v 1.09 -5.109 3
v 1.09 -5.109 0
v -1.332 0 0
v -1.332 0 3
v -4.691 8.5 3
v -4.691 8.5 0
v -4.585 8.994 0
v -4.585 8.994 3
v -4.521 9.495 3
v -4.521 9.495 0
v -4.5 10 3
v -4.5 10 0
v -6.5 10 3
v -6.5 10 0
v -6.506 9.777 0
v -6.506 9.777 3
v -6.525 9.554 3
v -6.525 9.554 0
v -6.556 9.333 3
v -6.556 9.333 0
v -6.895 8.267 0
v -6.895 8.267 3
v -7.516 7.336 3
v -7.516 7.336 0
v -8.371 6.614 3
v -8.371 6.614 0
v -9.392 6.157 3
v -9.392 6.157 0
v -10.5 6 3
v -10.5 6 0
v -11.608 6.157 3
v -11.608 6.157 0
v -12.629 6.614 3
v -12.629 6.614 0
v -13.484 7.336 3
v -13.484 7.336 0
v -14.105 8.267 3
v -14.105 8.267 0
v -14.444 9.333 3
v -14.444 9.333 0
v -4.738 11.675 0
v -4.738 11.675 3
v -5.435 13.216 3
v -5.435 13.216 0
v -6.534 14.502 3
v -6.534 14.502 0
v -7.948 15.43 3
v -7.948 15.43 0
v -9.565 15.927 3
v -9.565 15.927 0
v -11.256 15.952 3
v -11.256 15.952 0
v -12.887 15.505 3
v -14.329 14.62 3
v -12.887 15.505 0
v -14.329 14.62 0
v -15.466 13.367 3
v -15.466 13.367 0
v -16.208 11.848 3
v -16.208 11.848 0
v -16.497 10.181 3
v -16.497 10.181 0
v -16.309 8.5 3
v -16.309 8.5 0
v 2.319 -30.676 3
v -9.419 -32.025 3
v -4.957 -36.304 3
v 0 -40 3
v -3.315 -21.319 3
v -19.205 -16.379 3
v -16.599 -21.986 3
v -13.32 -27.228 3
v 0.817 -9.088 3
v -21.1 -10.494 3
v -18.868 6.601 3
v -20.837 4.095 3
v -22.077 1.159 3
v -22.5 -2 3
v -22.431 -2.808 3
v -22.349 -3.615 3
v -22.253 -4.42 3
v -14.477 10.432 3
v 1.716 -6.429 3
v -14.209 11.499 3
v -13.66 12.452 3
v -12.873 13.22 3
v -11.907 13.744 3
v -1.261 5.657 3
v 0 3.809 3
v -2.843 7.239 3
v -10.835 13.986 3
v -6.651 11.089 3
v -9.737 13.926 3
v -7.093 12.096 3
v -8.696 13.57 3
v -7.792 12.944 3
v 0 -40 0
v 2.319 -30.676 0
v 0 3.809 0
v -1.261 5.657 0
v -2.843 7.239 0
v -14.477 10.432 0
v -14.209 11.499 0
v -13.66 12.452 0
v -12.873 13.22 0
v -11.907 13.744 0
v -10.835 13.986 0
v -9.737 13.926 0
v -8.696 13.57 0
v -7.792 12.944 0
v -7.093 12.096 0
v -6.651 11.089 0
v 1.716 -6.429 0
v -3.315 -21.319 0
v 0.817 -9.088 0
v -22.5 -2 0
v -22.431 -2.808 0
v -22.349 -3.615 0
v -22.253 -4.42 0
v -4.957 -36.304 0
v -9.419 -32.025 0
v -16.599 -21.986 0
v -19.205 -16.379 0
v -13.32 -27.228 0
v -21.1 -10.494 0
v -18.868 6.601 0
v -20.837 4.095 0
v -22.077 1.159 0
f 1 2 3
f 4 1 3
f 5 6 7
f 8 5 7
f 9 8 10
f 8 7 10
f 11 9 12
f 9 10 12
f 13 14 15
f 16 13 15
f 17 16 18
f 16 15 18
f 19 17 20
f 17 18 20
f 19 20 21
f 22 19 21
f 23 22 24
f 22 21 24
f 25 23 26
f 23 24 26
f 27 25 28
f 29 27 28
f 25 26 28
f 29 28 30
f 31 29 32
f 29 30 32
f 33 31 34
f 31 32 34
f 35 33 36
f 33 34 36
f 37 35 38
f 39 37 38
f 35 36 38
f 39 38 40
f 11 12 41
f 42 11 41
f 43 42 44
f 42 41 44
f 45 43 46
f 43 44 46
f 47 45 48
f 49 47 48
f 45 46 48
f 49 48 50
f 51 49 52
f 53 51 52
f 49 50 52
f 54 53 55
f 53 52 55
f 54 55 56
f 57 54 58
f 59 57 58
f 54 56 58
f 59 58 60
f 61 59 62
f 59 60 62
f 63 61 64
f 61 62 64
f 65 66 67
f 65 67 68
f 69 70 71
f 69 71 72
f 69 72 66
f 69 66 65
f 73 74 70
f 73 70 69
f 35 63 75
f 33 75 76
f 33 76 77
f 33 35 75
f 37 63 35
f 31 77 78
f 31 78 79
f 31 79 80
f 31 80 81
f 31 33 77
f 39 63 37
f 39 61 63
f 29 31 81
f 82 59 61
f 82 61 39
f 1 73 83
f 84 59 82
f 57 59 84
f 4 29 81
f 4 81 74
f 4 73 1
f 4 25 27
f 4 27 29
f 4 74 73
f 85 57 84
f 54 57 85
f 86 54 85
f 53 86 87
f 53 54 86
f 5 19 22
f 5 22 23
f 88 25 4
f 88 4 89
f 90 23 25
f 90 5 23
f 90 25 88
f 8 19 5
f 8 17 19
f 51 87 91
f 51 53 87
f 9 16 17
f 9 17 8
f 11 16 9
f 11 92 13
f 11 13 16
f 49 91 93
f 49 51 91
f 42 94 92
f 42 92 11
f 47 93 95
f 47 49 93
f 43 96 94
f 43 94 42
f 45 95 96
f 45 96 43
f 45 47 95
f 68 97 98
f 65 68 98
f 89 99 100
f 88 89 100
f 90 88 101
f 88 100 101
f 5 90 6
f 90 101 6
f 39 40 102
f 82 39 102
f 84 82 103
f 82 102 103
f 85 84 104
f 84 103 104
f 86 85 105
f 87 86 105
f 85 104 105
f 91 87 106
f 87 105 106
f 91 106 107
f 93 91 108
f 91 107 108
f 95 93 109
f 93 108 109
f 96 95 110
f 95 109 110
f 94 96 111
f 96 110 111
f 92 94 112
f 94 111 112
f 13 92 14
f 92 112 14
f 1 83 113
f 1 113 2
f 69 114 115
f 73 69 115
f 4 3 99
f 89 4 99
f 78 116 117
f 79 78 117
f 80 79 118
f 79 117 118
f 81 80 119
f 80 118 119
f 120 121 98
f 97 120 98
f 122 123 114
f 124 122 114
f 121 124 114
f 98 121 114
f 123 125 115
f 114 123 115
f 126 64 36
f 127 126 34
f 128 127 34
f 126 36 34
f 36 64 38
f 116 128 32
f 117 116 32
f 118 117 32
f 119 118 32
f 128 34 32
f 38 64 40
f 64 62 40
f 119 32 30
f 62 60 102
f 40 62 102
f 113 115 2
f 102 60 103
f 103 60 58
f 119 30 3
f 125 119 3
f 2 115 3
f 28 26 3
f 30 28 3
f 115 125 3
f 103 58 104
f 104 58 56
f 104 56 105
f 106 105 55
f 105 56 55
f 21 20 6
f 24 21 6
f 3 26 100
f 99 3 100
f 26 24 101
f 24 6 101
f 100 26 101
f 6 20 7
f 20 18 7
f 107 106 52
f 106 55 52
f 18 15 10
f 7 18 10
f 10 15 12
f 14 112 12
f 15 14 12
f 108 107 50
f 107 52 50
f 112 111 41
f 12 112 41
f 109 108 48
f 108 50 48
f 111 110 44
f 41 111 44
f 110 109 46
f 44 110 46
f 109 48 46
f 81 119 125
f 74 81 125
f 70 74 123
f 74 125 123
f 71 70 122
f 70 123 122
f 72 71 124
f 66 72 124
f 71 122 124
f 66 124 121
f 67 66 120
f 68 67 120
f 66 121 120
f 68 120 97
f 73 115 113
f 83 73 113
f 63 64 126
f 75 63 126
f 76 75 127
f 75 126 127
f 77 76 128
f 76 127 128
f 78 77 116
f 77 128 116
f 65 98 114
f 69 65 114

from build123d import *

# Parameters (mm, degrees)
F1_DEPTH = 3


with BuildPart() as f1:
    # F0 (on Top) → F1 (new body)
    with BuildSketch(Plane.XY):
        with BuildLine():
            ThreePointArc((-6.5559468113, 9.3333333333), (-5.6054684353, 8.9564392374), (-4.6905249807, 8.5))
            ThreePointArc((-4.6905249807, 8.5), (-4.5478218224, 9.2439742451), (-4.5, 10))
            ThreePointArc((-4.5, 10), (-11.2560257549, 15.9521781776), (-16.3094750193, 8.5))
            ThreePointArc((-16.3094750193, 8.5), (-15.3945315647, 8.9564392374), (-14.4440531887, 9.3333333333))
            ThreePointArc((-14.4440531887, 9.3333333333), (-10.8345050411, 13.9859887578), (-6.5, 10))
            ThreePointArc((-6.5, 10), (-6.5140112422, 9.6654949589), (-6.5559468113, 9.3333333333))
        make_face()
        with BuildLine():
            ThreePointArc((-16.3094750193, 8.5), (-10.5, 4), (-4.6905249807, 8.5))
            ThreePointArc((-4.6905249807, 8.5), (-5.6054684353, 8.9564392374), (-6.5559468113, 9.3333333333))
            ThreePointArc((-6.5559468113, 9.3333333333), (-10.5, 6), (-14.4440531887, 9.3333333333))
            ThreePointArc((-14.4440531887, 9.3333333333), (-15.3945315647, 8.9564392374), (-16.3094750193, 8.5))
        make_face()
        with BuildLine():
            ThreePointArc((-1.3321595662, 0), (-0.8273722771, 1.9611409085), (0, 3.8094750193))
            ThreePointArc((0, 3.8094750193), (-2.0147186258, 6.4852813742), (-4.6905249807, 8.5))
            ThreePointArc((-4.6905249807, 8.5), (-10.5, 4), (-16.3094750193, 8.5))
            ThreePointArc((-16.3094750193, 8.5), (-20.8371587061, 4.094518019), (-22.5, -2))
            ThreePointArc((-22.5, -2), (-22.3914639986, -3.2113902714), (-22.253495394, -4.4197822265))
            ThreePointArc((-22.253495394, -4.4197822265), (-12.3070188109, -13.8631649663), (0, -7.8094750193))
            ThreePointArc((0, -7.8094750193), (-1.3291298387, -4.0178422283), (-1.3321595662, 0))
        make_face()
        with BuildLine():
            ThreePointArc((0, -7.8094750193), (0.6272994629, -6.4925723882), (1.0901824777, -5.1092877211))
            Line((1.0901824777, -5.1092877211), (-1.3321595662, 0))
            ThreePointArc((-1.3321595662, 0), (-1.3291298387, -4.0178422283), (0, -7.8094750193))
        make_face()
        with BuildLine():
            Line((1.7156613405, -6.4285693978), (1.0901824777, -5.1092877211))
            ThreePointArc((1.0901824777, -5.1092877211), (0.6272994629, -6.4925723882), (0, -7.8094750193))
            ThreePointArc((0, -7.8094750193), (0.3883389068, -8.4617574959), (0.8171440868, -9.0881803987))
            Line((0.8171440868, -9.0881803987), (1.7156613405, -6.4285693978))
        make_face()
        with BuildLine():
            ThreePointArc((0.8171440868, -9.0881803987), (0.3883389068, -8.4617574959), (0, -7.8094750193))
            ThreePointArc((0, -7.8094750193), (-12.3070188109, -13.8631649663), (-22.253495394, -4.4197822265))
            ThreePointArc((-22.253495394, -4.4197822265), (-15.0403231441, -24.6576201784), (0, -40))
            Line((0, -40), (2.3193413737, -30.6764196892))
            Line((2.3193413737, -30.6764196892), (-3.3150132865, -21.3193659027))
            Line((-3.3150132865, -21.3193659027), (0.8171440868, -9.0881803987))
        make_face()
        with BuildLine():
            Line((-1.3321595662, 0), (0, 3.8094750193))
            ThreePointArc((0, 3.8094750193), (-0.8273722771, 1.9611409085), (-1.3321595662, 0))
        make_face()
    extrude(amount=F1_DEPTH)


solid = f1.part
